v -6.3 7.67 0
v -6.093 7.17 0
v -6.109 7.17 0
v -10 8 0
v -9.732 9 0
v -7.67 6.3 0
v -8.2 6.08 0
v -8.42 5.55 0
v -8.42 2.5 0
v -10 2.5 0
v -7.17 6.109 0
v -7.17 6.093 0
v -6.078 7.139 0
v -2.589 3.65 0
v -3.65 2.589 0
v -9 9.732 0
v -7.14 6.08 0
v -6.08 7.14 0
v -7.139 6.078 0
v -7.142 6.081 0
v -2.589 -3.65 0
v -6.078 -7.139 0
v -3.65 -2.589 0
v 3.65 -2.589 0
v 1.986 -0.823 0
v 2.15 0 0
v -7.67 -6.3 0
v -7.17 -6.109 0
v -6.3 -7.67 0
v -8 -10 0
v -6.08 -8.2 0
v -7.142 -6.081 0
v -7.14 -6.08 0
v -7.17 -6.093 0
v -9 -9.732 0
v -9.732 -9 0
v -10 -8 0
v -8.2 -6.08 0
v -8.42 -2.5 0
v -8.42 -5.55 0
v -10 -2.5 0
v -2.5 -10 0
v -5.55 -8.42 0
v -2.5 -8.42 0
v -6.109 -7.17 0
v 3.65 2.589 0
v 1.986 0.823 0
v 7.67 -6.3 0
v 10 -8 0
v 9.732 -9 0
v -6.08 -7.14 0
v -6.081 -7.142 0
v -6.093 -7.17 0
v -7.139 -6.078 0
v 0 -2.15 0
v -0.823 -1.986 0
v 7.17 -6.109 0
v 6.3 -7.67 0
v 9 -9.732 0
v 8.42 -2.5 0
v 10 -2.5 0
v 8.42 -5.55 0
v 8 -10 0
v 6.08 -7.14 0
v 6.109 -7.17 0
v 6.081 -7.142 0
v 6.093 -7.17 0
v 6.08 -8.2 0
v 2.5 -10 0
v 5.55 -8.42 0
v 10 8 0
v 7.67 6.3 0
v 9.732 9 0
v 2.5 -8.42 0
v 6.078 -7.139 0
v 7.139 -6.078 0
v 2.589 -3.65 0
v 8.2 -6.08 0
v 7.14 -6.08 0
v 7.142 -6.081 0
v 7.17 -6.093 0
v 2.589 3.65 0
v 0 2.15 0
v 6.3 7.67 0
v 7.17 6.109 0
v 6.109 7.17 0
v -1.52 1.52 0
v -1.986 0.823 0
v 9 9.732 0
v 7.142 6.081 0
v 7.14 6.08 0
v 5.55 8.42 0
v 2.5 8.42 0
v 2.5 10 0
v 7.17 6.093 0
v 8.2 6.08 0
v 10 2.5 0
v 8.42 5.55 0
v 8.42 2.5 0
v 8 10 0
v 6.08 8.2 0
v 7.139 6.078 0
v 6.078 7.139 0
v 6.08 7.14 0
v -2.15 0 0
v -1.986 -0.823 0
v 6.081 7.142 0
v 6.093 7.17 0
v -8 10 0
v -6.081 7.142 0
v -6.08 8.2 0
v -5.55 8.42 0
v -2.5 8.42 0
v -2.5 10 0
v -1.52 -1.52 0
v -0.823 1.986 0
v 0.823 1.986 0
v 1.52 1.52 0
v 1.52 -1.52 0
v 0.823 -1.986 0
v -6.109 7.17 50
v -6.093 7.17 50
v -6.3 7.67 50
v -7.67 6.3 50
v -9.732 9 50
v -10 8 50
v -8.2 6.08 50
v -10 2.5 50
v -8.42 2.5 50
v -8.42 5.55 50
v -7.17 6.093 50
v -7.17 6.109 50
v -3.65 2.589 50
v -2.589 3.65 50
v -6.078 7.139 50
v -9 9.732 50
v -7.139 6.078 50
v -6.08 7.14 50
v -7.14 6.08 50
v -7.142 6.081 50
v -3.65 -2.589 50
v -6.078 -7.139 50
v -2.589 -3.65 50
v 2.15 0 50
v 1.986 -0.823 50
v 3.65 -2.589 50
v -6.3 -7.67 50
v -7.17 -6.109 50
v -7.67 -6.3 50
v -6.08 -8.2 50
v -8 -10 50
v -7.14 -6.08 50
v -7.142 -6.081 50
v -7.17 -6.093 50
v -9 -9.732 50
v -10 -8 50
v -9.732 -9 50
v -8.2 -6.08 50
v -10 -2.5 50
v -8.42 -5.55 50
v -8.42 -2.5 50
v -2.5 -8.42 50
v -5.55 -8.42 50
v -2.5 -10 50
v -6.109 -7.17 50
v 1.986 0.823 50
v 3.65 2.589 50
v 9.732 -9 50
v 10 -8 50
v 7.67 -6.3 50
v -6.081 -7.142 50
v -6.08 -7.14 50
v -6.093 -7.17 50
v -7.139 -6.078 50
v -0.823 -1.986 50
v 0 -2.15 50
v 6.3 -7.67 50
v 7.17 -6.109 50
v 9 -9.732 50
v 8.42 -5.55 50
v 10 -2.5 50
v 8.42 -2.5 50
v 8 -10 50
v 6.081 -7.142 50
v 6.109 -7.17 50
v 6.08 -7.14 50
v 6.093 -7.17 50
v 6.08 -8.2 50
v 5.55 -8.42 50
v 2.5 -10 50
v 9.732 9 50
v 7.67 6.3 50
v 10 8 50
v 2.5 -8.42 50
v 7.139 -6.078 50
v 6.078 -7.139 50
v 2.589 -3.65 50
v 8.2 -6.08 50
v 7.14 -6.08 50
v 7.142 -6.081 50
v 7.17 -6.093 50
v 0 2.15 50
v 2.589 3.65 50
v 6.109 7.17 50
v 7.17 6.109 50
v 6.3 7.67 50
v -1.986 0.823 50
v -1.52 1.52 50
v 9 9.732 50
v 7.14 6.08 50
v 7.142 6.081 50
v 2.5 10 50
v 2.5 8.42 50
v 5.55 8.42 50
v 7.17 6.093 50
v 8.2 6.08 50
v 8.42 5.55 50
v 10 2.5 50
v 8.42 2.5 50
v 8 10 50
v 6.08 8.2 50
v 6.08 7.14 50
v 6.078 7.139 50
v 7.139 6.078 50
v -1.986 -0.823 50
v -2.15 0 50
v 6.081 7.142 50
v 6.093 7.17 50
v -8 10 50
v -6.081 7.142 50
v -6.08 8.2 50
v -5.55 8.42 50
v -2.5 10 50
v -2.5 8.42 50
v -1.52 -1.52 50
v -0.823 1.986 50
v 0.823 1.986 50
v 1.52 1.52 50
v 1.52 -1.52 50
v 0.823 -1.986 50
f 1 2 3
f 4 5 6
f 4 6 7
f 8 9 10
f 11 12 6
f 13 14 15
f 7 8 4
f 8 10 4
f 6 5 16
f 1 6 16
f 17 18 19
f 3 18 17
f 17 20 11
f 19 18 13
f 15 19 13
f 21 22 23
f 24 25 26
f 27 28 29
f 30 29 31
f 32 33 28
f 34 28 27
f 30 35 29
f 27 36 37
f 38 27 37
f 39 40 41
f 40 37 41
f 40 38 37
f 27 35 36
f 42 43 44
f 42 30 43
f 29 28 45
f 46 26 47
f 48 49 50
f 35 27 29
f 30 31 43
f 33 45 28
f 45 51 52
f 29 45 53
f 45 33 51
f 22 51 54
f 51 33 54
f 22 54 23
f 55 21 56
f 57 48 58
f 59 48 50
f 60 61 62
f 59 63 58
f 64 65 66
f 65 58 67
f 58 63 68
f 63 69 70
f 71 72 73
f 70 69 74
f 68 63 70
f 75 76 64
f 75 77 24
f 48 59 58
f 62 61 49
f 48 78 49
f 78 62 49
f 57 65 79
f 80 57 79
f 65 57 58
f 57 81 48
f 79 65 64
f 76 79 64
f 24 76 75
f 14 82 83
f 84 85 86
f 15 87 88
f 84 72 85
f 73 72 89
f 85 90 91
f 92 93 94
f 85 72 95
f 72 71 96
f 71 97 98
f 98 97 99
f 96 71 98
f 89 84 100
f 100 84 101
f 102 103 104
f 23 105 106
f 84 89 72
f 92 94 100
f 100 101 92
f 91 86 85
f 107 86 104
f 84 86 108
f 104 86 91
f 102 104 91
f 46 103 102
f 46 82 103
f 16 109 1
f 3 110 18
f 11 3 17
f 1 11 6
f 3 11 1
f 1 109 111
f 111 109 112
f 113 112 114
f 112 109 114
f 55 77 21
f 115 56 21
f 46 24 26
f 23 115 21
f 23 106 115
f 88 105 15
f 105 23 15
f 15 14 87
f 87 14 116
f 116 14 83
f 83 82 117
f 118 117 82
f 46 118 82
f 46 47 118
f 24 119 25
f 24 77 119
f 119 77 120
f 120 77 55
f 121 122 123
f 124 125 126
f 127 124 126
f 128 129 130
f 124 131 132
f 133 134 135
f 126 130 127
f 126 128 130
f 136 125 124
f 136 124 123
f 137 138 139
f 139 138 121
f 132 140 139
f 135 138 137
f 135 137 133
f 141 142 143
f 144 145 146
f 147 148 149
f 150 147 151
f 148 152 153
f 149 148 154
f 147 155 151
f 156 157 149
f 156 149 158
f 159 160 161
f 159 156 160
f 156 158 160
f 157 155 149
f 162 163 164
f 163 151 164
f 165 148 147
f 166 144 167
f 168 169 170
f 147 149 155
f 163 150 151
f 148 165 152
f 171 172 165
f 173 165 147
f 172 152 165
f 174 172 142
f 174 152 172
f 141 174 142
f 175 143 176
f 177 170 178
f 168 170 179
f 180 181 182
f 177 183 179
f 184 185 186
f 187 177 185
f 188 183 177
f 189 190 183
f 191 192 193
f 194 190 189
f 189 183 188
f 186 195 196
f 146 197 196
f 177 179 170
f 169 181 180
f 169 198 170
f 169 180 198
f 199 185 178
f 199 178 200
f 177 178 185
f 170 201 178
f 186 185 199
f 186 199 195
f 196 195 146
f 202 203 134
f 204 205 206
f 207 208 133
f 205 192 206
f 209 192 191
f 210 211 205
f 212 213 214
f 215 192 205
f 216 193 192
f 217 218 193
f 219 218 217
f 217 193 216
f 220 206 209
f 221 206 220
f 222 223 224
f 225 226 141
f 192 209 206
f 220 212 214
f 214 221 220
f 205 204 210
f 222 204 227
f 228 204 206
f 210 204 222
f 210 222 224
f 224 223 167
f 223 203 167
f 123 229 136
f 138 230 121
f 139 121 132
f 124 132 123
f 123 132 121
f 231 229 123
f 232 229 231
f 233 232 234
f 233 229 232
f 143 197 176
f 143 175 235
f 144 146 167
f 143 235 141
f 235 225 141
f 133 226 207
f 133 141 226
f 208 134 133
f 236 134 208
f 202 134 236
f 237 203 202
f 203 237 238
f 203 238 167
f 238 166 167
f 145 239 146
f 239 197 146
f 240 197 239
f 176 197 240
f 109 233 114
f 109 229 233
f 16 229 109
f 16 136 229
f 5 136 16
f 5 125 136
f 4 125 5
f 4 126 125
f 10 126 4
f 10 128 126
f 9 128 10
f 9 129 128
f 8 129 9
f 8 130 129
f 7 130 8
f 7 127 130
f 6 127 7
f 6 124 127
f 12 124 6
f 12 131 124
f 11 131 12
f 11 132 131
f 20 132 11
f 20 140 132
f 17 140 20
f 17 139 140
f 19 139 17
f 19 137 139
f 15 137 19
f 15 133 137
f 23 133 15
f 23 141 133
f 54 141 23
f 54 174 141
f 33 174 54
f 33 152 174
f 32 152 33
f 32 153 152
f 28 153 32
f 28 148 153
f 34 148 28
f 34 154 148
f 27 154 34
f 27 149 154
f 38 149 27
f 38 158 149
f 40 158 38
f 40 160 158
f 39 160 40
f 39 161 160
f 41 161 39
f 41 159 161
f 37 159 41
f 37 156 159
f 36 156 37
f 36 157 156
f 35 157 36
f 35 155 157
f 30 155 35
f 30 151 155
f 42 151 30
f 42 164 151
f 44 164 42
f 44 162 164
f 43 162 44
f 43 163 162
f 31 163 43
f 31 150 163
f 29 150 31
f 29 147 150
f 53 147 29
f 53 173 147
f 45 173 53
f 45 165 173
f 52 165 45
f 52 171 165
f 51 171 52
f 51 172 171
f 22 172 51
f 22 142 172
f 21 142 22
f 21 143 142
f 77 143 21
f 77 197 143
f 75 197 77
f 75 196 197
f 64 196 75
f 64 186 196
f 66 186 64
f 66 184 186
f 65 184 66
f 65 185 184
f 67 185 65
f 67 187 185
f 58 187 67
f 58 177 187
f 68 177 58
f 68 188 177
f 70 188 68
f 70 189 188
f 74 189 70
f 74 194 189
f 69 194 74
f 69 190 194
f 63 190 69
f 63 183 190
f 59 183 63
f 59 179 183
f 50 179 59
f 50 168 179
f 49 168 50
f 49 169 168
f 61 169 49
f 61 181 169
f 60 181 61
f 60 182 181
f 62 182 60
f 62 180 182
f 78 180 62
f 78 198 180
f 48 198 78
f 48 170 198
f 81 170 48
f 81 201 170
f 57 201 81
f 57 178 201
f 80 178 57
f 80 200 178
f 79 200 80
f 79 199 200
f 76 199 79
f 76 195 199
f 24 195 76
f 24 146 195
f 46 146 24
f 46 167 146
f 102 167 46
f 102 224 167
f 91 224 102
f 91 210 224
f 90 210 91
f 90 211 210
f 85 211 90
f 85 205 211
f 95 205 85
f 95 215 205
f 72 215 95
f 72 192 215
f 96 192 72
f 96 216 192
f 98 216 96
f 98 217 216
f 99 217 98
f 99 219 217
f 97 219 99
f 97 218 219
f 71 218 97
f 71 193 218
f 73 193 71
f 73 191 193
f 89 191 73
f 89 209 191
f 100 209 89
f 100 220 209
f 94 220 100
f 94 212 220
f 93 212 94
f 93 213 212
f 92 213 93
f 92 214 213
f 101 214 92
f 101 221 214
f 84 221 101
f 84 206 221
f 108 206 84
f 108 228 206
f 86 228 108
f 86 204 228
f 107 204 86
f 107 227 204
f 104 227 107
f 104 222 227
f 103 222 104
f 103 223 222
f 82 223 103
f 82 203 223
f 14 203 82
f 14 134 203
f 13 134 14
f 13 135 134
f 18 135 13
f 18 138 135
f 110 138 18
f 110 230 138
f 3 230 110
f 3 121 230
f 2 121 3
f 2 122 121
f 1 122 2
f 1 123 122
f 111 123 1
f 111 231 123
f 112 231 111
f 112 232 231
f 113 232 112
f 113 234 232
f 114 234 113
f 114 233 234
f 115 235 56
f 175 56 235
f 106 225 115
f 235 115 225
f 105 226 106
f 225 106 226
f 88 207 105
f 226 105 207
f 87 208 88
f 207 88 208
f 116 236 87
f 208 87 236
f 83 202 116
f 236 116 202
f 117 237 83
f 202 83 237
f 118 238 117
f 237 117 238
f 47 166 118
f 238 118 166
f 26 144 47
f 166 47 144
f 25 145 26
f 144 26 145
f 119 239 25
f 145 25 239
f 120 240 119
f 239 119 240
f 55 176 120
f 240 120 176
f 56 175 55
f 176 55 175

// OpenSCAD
module profileI5(l) {
    color("Silver") render(convexity=8) linear_extrude(height=l, convexity=8) {
        difference() {
            union() {
                for(i=[-1, 1]) {
                    for(j=[-1, 1]) {
                        translate([i*8, j*8, 0]) circle(d=4, $fn=12);
                        translate([i*(10-1.58/2), j*(2.5+5.5/2), 0]) square([1.58, 5.5], center=true);
                        translate([i*(2.5+5.5/2), j*(10-1.58/2), 0]) square([5.5, 1.58], center=true);
                        translate([i*(5.55+1.5/2), j*(10-1.58-1.5/3), 0]) square([1.5, 1.5], center=true);
                        translate([i*(10-1.58-1.5/3), j*(5.55+1.5/2), 0]) square([1.5, 1.5], center=true);
                    }
                    rotate([0, 0, i*45]) square([20, 1.5], center=true);
                }
                square([2*(10-6.35), 2*(10-6.35)], center=true);
            }
            circle(d=4.3, $fn=16);
            for(i=[-1, 1]) {
                for(j=[-1, 1]) {
                    translate([i*5.55, j*(10-1.58-1.5/2), 0]) circle(d=1.5, $fn=8);
                    translate([i*(10-1.58-1.5/2), j*5.55, 0]) circle(d=1.5, $fn=8);
                }
            }
        }
    }
}

profileI5(50);
